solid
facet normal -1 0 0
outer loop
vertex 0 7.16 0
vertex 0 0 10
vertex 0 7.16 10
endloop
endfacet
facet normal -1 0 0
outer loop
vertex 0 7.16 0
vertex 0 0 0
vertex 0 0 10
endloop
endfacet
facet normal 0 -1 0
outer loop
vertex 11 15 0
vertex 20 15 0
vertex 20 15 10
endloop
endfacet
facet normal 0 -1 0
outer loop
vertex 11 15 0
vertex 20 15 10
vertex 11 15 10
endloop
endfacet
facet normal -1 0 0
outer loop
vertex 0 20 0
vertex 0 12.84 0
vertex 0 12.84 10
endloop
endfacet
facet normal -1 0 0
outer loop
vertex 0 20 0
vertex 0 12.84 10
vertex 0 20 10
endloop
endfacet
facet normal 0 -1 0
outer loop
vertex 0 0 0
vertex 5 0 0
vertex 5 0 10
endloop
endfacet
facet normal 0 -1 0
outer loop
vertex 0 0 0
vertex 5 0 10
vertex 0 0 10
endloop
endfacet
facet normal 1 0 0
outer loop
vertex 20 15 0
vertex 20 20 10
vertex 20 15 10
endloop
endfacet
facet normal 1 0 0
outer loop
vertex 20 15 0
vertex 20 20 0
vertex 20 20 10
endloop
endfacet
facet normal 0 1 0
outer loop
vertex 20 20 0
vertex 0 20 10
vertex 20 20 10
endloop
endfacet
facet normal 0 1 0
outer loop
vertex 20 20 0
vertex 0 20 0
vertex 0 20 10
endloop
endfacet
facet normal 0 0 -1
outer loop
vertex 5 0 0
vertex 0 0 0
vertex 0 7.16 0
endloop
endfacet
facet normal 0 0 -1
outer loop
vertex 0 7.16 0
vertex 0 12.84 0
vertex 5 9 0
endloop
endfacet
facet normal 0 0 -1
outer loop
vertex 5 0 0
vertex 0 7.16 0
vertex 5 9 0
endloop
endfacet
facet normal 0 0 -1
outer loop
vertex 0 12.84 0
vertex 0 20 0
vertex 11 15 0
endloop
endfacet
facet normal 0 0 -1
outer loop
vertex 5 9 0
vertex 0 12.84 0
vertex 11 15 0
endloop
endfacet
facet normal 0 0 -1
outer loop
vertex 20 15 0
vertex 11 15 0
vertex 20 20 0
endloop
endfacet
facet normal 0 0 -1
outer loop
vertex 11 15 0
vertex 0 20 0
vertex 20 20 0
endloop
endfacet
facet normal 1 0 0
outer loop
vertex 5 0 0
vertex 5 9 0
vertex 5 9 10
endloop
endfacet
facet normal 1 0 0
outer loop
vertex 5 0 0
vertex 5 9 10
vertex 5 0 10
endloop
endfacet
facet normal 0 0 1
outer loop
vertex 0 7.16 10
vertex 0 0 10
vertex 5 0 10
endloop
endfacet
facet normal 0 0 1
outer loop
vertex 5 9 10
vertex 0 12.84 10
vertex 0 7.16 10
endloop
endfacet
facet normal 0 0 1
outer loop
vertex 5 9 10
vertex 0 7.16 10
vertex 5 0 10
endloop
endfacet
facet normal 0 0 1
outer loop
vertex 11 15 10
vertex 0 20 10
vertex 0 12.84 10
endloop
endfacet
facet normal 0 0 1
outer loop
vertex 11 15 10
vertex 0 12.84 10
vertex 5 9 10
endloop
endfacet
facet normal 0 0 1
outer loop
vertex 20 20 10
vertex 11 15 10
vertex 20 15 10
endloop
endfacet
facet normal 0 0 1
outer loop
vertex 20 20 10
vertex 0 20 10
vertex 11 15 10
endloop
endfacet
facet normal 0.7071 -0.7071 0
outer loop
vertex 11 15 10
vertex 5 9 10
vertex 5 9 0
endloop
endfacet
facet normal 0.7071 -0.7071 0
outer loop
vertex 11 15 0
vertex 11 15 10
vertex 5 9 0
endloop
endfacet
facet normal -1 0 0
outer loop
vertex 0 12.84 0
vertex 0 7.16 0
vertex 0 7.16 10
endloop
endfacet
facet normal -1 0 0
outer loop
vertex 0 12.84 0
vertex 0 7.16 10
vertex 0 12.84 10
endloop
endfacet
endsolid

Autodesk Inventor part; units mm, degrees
ref_plane "YZ Plane" through (0, 0, 0) normal (1, 0, 0) x (0, 1, 0)
ref_plane "XZ Plane" through (0, 0, 0) normal (0, 1, 0) x (-1, 0, 0)
ref_plane "XY Plane" through (0, 0, 0) normal (0, 0, 1) x (1, 0, 0)
sketch "Boceto1" plane through (0, 0, 0) normal (0, 0, 1) x (1, 0, 0)
  line L0 (0, 0) -> (0, 20)
  line L1 (0, 20) -> (20, 20)
  line L2 (20, 20) -> (20, 15)
  line L3 (20, 15) -> (5, 15)
  line L4 (5, 15) -> (5, 0)
  line L5 (5, 0) -> (0, 0)
  line L6 (0, 12.84) -> (-1.8, 12.84)
  line L7 (-1.8, 12.84) -> (-1.8, 15.5)
  line L8 (-1.8, 15.5) -> (-3.44, 15.5)
  line L9 (-3.44, 15.5) -> (-3.44, 4.5)
  line L10 (-3.44, 4.5) -> (-1.8, 4.5)
  line L11 (-1.8, 4.5) -> (-1.8, 7.16)
  line L12 (-1.8, 7.16) -> (0, 7.16)
  line L13 (0, 12.84) -> (0, 7.16)
  dimension "d0" = 20
  dimension "d1" = 20
  dimension "d2" = 5
  dimension "d3" = 5
  dimension "d7" = 11
  dimension "d8" = 1.8
  dimension "d9" = 1.64
  dimension "d10" = 5.68
  dimension "d11" = 2.66
  dimension "d12" = 2.66
  dimension "d13" = 7.16
  dimension "d14" = 7.16
extrude "Extrusión1" add sketch "Boceto1" along normal blind 10 contours L0 L1 L2 L3 L4 L5
chamfer "Chaflán1" distance 6 angle 45 1 edges at (5, 15, 5)
equation "\"d11\" = d12"
equation "\"d13\" = d14"
properties part number "Soporte_cajas" material "Plástico PC/ABS"
